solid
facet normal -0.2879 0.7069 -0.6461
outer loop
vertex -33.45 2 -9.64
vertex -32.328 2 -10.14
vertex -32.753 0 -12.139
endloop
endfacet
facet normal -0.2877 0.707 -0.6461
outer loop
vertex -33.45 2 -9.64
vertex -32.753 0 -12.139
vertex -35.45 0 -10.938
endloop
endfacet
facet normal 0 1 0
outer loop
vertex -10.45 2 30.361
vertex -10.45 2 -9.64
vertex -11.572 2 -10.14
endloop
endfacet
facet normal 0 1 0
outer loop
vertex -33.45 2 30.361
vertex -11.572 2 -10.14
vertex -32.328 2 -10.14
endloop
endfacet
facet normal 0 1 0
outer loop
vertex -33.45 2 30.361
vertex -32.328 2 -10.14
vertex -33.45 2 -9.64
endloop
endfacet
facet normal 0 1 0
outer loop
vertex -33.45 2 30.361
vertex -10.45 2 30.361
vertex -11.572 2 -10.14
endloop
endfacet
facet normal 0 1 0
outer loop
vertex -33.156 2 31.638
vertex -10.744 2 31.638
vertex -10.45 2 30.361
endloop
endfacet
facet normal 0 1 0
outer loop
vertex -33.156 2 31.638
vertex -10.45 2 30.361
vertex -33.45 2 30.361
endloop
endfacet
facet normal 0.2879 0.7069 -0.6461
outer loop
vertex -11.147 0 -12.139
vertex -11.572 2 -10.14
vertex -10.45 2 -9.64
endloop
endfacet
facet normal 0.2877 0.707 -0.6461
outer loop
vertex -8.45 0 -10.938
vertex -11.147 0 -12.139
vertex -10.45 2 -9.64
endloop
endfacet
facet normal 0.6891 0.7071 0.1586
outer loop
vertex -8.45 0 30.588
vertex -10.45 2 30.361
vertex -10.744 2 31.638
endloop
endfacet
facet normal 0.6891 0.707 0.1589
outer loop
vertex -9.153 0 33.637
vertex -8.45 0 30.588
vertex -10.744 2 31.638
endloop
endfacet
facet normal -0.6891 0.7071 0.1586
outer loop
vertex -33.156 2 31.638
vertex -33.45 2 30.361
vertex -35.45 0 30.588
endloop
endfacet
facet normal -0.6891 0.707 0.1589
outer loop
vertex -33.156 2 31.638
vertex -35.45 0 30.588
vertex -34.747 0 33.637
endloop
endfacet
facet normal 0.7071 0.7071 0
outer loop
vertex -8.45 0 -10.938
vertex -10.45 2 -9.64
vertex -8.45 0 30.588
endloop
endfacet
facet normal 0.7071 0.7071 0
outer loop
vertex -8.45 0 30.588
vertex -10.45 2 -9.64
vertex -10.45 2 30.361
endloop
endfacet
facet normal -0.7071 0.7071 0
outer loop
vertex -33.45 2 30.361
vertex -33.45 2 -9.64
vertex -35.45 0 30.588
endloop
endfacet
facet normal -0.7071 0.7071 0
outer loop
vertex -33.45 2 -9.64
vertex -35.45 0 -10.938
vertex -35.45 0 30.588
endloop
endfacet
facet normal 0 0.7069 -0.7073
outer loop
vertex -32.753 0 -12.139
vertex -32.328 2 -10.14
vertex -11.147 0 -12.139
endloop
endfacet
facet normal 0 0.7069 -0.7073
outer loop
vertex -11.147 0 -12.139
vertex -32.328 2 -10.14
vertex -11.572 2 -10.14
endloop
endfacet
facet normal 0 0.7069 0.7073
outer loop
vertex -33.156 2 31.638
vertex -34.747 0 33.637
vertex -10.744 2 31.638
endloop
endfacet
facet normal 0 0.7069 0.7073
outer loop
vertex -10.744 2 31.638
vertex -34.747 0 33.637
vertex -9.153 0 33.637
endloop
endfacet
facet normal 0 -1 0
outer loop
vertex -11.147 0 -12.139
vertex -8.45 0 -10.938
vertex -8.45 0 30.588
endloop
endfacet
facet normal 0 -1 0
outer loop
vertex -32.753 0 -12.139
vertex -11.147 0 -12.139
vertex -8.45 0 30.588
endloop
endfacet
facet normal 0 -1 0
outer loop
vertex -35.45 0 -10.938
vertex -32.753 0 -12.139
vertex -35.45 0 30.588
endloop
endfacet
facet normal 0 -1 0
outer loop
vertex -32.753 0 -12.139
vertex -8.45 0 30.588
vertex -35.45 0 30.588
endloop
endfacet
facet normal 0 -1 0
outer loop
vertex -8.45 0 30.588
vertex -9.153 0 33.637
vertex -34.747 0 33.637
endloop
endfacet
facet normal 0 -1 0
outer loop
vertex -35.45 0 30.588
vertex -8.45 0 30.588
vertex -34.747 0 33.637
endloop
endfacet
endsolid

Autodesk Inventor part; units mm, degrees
ref_plane "YZ Plane" through (0, 0, 0) normal (1, 0, 0) x (0, 1, 0)
ref_plane "XZ Plane" through (0, 0, 0) normal (0, 1, 0) x (-1, 0, 0)
ref_plane "XY Plane" through (0, 0, 0) normal (0, 0, 1) x (1, 0, 0)
sketch "Sketch1" plane through (0, 0, 0) normal (0, 1, 0) x (-1, 0, 0)
  line L0 (11.1472, -12.1394) -> (32.7528, -12.1394)
  line L1 (32.7528, -12.1394) -> (11.1472, -12.1394)
  line L2 (8.45, -10.938) -> (11.1472, -12.1394)
  line L3 (11.1472, -12.1394) -> (8.45, -10.938)
  line L4 (8.45, -10.938) -> (10.45, -9.6394)
  line L5 (8.45, 30.5881) -> (8.45, -10.938)
  line L6 (8.45, -10.938) -> (8.45, 30.5881)
  line L7 (9.1529, 33.6372) -> (10.7443, 31.6372)
  line L8 (8.45, 30.5881) -> (9.1529, 33.6372)
  line L9 (35.45, -10.938) -> (35.45, 30.5881)
  line L10 (8.45, -10.938) -> (35.45, -10.938)
  line L11 (35.45, 30.5881) -> (33.45, 30.3606)
  line L12 (8.45, 30.5881) -> (35.45, 30.5881)
  line L13 (34.747, 33.6372) -> (9.1529, 33.6372)
  line L14 (9.1529, 33.6372) -> (34.747, 33.6372)
  line L15 (11.1472, -12.1394) -> (32.7528, -12.1394)
  line L16 (8.45, 30.5881) -> (9.1529, 33.6372)
  line L17 (9.1529, 33.6372) -> (34.747, 33.6372)
  line L18 (11.5725, -10.1394) -> (32.3275, -10.1394)
  line L19 (32.3275, -10.1394) -> (11.5725, -10.1394)
  line L20 (11.1472, -12.1394) -> (8.45, -10.938)
  line L21 (8.45, -10.938) -> (8.45, 30.5881)
  line L22 (8.45, 30.5881) -> (9.1529, 33.6372)
  line L23 (34.747, 33.6372) -> (9.1529, 33.6372)
  line L24 (35.45, 30.5881) -> (34.747, 33.6372)
  line L25 (34.747, 33.6372) -> (35.45, 30.5881)
  line L26 (32.7528, -12.1394) -> (35.45, -10.938)
  line L27 (32.7528, -12.1394) -> (35.45, -10.938)
  line L28 (33.45, -9.6394) -> (33.45, 30.3606)
  line L29 (32.3275, -10.1394) -> (33.45, -9.6394)
  line L30 (33.45, 30.3606) -> (33.45, -9.6394)
  line L31 (32.3275, -10.1394) -> (11.5725, -10.1394)
  line L32 (10.45, -9.6394) -> (11.5725, -10.1394)
  line L33 (11.5725, -10.1394) -> (10.45, -9.6394)
  line L34 (10.45, -9.6394) -> (10.45, 30.3606)
  line L35 (10.45, 30.3606) -> (10.7443, 31.6372)
  line L36 (33.1557, 31.6372) -> (10.7443, 31.6372)
  line L37 (33.45, 30.3606) -> (33.1557, 31.6372)
  point P0 (0, 0)
  point P1 (-34.55, -34.6394)
extrude "Extrusion1" add sketch "Sketch1" along normal blind 2
chamfer "Chamfer1" distance 2 angle 45 8 edges at (-35.45, 2, 9.8251) (-35.0985, 2, 32.1127) (-21.95, 2, 33.6372) (-8.8014, 2, 32.1127) (-8.45, 2, 9.8251) (-21.95, 2, -12.1394) (-9.7986, 2, -11.5387) (-34.1014, 2, -11.5387)
sketch "Sketch2" plane through (0, 2, 0) normal (0, 1, 0) x (1, 0, 0)
  point P0 (0, 0)
equation "\"BendRadius\" = Thickness"
equation "\"BendReliefWidth\" = Thickness"
equation "\"BendReliefDepth\" = 0.5 * Thickness"
equation "\"CornerReliefSize\" = 4 * Thickness"
equation "\"MinimumRemnant\" = 2 * Thickness"
equation "\"TransitionRadius\" = BendRadius"
equation "\"JacobiRadiusSize\" = BendRadius"
equation "\"GapSize\" = Thickness"
equation "\"Thickness\" = 0.5"
properties part number "Part3edd"
